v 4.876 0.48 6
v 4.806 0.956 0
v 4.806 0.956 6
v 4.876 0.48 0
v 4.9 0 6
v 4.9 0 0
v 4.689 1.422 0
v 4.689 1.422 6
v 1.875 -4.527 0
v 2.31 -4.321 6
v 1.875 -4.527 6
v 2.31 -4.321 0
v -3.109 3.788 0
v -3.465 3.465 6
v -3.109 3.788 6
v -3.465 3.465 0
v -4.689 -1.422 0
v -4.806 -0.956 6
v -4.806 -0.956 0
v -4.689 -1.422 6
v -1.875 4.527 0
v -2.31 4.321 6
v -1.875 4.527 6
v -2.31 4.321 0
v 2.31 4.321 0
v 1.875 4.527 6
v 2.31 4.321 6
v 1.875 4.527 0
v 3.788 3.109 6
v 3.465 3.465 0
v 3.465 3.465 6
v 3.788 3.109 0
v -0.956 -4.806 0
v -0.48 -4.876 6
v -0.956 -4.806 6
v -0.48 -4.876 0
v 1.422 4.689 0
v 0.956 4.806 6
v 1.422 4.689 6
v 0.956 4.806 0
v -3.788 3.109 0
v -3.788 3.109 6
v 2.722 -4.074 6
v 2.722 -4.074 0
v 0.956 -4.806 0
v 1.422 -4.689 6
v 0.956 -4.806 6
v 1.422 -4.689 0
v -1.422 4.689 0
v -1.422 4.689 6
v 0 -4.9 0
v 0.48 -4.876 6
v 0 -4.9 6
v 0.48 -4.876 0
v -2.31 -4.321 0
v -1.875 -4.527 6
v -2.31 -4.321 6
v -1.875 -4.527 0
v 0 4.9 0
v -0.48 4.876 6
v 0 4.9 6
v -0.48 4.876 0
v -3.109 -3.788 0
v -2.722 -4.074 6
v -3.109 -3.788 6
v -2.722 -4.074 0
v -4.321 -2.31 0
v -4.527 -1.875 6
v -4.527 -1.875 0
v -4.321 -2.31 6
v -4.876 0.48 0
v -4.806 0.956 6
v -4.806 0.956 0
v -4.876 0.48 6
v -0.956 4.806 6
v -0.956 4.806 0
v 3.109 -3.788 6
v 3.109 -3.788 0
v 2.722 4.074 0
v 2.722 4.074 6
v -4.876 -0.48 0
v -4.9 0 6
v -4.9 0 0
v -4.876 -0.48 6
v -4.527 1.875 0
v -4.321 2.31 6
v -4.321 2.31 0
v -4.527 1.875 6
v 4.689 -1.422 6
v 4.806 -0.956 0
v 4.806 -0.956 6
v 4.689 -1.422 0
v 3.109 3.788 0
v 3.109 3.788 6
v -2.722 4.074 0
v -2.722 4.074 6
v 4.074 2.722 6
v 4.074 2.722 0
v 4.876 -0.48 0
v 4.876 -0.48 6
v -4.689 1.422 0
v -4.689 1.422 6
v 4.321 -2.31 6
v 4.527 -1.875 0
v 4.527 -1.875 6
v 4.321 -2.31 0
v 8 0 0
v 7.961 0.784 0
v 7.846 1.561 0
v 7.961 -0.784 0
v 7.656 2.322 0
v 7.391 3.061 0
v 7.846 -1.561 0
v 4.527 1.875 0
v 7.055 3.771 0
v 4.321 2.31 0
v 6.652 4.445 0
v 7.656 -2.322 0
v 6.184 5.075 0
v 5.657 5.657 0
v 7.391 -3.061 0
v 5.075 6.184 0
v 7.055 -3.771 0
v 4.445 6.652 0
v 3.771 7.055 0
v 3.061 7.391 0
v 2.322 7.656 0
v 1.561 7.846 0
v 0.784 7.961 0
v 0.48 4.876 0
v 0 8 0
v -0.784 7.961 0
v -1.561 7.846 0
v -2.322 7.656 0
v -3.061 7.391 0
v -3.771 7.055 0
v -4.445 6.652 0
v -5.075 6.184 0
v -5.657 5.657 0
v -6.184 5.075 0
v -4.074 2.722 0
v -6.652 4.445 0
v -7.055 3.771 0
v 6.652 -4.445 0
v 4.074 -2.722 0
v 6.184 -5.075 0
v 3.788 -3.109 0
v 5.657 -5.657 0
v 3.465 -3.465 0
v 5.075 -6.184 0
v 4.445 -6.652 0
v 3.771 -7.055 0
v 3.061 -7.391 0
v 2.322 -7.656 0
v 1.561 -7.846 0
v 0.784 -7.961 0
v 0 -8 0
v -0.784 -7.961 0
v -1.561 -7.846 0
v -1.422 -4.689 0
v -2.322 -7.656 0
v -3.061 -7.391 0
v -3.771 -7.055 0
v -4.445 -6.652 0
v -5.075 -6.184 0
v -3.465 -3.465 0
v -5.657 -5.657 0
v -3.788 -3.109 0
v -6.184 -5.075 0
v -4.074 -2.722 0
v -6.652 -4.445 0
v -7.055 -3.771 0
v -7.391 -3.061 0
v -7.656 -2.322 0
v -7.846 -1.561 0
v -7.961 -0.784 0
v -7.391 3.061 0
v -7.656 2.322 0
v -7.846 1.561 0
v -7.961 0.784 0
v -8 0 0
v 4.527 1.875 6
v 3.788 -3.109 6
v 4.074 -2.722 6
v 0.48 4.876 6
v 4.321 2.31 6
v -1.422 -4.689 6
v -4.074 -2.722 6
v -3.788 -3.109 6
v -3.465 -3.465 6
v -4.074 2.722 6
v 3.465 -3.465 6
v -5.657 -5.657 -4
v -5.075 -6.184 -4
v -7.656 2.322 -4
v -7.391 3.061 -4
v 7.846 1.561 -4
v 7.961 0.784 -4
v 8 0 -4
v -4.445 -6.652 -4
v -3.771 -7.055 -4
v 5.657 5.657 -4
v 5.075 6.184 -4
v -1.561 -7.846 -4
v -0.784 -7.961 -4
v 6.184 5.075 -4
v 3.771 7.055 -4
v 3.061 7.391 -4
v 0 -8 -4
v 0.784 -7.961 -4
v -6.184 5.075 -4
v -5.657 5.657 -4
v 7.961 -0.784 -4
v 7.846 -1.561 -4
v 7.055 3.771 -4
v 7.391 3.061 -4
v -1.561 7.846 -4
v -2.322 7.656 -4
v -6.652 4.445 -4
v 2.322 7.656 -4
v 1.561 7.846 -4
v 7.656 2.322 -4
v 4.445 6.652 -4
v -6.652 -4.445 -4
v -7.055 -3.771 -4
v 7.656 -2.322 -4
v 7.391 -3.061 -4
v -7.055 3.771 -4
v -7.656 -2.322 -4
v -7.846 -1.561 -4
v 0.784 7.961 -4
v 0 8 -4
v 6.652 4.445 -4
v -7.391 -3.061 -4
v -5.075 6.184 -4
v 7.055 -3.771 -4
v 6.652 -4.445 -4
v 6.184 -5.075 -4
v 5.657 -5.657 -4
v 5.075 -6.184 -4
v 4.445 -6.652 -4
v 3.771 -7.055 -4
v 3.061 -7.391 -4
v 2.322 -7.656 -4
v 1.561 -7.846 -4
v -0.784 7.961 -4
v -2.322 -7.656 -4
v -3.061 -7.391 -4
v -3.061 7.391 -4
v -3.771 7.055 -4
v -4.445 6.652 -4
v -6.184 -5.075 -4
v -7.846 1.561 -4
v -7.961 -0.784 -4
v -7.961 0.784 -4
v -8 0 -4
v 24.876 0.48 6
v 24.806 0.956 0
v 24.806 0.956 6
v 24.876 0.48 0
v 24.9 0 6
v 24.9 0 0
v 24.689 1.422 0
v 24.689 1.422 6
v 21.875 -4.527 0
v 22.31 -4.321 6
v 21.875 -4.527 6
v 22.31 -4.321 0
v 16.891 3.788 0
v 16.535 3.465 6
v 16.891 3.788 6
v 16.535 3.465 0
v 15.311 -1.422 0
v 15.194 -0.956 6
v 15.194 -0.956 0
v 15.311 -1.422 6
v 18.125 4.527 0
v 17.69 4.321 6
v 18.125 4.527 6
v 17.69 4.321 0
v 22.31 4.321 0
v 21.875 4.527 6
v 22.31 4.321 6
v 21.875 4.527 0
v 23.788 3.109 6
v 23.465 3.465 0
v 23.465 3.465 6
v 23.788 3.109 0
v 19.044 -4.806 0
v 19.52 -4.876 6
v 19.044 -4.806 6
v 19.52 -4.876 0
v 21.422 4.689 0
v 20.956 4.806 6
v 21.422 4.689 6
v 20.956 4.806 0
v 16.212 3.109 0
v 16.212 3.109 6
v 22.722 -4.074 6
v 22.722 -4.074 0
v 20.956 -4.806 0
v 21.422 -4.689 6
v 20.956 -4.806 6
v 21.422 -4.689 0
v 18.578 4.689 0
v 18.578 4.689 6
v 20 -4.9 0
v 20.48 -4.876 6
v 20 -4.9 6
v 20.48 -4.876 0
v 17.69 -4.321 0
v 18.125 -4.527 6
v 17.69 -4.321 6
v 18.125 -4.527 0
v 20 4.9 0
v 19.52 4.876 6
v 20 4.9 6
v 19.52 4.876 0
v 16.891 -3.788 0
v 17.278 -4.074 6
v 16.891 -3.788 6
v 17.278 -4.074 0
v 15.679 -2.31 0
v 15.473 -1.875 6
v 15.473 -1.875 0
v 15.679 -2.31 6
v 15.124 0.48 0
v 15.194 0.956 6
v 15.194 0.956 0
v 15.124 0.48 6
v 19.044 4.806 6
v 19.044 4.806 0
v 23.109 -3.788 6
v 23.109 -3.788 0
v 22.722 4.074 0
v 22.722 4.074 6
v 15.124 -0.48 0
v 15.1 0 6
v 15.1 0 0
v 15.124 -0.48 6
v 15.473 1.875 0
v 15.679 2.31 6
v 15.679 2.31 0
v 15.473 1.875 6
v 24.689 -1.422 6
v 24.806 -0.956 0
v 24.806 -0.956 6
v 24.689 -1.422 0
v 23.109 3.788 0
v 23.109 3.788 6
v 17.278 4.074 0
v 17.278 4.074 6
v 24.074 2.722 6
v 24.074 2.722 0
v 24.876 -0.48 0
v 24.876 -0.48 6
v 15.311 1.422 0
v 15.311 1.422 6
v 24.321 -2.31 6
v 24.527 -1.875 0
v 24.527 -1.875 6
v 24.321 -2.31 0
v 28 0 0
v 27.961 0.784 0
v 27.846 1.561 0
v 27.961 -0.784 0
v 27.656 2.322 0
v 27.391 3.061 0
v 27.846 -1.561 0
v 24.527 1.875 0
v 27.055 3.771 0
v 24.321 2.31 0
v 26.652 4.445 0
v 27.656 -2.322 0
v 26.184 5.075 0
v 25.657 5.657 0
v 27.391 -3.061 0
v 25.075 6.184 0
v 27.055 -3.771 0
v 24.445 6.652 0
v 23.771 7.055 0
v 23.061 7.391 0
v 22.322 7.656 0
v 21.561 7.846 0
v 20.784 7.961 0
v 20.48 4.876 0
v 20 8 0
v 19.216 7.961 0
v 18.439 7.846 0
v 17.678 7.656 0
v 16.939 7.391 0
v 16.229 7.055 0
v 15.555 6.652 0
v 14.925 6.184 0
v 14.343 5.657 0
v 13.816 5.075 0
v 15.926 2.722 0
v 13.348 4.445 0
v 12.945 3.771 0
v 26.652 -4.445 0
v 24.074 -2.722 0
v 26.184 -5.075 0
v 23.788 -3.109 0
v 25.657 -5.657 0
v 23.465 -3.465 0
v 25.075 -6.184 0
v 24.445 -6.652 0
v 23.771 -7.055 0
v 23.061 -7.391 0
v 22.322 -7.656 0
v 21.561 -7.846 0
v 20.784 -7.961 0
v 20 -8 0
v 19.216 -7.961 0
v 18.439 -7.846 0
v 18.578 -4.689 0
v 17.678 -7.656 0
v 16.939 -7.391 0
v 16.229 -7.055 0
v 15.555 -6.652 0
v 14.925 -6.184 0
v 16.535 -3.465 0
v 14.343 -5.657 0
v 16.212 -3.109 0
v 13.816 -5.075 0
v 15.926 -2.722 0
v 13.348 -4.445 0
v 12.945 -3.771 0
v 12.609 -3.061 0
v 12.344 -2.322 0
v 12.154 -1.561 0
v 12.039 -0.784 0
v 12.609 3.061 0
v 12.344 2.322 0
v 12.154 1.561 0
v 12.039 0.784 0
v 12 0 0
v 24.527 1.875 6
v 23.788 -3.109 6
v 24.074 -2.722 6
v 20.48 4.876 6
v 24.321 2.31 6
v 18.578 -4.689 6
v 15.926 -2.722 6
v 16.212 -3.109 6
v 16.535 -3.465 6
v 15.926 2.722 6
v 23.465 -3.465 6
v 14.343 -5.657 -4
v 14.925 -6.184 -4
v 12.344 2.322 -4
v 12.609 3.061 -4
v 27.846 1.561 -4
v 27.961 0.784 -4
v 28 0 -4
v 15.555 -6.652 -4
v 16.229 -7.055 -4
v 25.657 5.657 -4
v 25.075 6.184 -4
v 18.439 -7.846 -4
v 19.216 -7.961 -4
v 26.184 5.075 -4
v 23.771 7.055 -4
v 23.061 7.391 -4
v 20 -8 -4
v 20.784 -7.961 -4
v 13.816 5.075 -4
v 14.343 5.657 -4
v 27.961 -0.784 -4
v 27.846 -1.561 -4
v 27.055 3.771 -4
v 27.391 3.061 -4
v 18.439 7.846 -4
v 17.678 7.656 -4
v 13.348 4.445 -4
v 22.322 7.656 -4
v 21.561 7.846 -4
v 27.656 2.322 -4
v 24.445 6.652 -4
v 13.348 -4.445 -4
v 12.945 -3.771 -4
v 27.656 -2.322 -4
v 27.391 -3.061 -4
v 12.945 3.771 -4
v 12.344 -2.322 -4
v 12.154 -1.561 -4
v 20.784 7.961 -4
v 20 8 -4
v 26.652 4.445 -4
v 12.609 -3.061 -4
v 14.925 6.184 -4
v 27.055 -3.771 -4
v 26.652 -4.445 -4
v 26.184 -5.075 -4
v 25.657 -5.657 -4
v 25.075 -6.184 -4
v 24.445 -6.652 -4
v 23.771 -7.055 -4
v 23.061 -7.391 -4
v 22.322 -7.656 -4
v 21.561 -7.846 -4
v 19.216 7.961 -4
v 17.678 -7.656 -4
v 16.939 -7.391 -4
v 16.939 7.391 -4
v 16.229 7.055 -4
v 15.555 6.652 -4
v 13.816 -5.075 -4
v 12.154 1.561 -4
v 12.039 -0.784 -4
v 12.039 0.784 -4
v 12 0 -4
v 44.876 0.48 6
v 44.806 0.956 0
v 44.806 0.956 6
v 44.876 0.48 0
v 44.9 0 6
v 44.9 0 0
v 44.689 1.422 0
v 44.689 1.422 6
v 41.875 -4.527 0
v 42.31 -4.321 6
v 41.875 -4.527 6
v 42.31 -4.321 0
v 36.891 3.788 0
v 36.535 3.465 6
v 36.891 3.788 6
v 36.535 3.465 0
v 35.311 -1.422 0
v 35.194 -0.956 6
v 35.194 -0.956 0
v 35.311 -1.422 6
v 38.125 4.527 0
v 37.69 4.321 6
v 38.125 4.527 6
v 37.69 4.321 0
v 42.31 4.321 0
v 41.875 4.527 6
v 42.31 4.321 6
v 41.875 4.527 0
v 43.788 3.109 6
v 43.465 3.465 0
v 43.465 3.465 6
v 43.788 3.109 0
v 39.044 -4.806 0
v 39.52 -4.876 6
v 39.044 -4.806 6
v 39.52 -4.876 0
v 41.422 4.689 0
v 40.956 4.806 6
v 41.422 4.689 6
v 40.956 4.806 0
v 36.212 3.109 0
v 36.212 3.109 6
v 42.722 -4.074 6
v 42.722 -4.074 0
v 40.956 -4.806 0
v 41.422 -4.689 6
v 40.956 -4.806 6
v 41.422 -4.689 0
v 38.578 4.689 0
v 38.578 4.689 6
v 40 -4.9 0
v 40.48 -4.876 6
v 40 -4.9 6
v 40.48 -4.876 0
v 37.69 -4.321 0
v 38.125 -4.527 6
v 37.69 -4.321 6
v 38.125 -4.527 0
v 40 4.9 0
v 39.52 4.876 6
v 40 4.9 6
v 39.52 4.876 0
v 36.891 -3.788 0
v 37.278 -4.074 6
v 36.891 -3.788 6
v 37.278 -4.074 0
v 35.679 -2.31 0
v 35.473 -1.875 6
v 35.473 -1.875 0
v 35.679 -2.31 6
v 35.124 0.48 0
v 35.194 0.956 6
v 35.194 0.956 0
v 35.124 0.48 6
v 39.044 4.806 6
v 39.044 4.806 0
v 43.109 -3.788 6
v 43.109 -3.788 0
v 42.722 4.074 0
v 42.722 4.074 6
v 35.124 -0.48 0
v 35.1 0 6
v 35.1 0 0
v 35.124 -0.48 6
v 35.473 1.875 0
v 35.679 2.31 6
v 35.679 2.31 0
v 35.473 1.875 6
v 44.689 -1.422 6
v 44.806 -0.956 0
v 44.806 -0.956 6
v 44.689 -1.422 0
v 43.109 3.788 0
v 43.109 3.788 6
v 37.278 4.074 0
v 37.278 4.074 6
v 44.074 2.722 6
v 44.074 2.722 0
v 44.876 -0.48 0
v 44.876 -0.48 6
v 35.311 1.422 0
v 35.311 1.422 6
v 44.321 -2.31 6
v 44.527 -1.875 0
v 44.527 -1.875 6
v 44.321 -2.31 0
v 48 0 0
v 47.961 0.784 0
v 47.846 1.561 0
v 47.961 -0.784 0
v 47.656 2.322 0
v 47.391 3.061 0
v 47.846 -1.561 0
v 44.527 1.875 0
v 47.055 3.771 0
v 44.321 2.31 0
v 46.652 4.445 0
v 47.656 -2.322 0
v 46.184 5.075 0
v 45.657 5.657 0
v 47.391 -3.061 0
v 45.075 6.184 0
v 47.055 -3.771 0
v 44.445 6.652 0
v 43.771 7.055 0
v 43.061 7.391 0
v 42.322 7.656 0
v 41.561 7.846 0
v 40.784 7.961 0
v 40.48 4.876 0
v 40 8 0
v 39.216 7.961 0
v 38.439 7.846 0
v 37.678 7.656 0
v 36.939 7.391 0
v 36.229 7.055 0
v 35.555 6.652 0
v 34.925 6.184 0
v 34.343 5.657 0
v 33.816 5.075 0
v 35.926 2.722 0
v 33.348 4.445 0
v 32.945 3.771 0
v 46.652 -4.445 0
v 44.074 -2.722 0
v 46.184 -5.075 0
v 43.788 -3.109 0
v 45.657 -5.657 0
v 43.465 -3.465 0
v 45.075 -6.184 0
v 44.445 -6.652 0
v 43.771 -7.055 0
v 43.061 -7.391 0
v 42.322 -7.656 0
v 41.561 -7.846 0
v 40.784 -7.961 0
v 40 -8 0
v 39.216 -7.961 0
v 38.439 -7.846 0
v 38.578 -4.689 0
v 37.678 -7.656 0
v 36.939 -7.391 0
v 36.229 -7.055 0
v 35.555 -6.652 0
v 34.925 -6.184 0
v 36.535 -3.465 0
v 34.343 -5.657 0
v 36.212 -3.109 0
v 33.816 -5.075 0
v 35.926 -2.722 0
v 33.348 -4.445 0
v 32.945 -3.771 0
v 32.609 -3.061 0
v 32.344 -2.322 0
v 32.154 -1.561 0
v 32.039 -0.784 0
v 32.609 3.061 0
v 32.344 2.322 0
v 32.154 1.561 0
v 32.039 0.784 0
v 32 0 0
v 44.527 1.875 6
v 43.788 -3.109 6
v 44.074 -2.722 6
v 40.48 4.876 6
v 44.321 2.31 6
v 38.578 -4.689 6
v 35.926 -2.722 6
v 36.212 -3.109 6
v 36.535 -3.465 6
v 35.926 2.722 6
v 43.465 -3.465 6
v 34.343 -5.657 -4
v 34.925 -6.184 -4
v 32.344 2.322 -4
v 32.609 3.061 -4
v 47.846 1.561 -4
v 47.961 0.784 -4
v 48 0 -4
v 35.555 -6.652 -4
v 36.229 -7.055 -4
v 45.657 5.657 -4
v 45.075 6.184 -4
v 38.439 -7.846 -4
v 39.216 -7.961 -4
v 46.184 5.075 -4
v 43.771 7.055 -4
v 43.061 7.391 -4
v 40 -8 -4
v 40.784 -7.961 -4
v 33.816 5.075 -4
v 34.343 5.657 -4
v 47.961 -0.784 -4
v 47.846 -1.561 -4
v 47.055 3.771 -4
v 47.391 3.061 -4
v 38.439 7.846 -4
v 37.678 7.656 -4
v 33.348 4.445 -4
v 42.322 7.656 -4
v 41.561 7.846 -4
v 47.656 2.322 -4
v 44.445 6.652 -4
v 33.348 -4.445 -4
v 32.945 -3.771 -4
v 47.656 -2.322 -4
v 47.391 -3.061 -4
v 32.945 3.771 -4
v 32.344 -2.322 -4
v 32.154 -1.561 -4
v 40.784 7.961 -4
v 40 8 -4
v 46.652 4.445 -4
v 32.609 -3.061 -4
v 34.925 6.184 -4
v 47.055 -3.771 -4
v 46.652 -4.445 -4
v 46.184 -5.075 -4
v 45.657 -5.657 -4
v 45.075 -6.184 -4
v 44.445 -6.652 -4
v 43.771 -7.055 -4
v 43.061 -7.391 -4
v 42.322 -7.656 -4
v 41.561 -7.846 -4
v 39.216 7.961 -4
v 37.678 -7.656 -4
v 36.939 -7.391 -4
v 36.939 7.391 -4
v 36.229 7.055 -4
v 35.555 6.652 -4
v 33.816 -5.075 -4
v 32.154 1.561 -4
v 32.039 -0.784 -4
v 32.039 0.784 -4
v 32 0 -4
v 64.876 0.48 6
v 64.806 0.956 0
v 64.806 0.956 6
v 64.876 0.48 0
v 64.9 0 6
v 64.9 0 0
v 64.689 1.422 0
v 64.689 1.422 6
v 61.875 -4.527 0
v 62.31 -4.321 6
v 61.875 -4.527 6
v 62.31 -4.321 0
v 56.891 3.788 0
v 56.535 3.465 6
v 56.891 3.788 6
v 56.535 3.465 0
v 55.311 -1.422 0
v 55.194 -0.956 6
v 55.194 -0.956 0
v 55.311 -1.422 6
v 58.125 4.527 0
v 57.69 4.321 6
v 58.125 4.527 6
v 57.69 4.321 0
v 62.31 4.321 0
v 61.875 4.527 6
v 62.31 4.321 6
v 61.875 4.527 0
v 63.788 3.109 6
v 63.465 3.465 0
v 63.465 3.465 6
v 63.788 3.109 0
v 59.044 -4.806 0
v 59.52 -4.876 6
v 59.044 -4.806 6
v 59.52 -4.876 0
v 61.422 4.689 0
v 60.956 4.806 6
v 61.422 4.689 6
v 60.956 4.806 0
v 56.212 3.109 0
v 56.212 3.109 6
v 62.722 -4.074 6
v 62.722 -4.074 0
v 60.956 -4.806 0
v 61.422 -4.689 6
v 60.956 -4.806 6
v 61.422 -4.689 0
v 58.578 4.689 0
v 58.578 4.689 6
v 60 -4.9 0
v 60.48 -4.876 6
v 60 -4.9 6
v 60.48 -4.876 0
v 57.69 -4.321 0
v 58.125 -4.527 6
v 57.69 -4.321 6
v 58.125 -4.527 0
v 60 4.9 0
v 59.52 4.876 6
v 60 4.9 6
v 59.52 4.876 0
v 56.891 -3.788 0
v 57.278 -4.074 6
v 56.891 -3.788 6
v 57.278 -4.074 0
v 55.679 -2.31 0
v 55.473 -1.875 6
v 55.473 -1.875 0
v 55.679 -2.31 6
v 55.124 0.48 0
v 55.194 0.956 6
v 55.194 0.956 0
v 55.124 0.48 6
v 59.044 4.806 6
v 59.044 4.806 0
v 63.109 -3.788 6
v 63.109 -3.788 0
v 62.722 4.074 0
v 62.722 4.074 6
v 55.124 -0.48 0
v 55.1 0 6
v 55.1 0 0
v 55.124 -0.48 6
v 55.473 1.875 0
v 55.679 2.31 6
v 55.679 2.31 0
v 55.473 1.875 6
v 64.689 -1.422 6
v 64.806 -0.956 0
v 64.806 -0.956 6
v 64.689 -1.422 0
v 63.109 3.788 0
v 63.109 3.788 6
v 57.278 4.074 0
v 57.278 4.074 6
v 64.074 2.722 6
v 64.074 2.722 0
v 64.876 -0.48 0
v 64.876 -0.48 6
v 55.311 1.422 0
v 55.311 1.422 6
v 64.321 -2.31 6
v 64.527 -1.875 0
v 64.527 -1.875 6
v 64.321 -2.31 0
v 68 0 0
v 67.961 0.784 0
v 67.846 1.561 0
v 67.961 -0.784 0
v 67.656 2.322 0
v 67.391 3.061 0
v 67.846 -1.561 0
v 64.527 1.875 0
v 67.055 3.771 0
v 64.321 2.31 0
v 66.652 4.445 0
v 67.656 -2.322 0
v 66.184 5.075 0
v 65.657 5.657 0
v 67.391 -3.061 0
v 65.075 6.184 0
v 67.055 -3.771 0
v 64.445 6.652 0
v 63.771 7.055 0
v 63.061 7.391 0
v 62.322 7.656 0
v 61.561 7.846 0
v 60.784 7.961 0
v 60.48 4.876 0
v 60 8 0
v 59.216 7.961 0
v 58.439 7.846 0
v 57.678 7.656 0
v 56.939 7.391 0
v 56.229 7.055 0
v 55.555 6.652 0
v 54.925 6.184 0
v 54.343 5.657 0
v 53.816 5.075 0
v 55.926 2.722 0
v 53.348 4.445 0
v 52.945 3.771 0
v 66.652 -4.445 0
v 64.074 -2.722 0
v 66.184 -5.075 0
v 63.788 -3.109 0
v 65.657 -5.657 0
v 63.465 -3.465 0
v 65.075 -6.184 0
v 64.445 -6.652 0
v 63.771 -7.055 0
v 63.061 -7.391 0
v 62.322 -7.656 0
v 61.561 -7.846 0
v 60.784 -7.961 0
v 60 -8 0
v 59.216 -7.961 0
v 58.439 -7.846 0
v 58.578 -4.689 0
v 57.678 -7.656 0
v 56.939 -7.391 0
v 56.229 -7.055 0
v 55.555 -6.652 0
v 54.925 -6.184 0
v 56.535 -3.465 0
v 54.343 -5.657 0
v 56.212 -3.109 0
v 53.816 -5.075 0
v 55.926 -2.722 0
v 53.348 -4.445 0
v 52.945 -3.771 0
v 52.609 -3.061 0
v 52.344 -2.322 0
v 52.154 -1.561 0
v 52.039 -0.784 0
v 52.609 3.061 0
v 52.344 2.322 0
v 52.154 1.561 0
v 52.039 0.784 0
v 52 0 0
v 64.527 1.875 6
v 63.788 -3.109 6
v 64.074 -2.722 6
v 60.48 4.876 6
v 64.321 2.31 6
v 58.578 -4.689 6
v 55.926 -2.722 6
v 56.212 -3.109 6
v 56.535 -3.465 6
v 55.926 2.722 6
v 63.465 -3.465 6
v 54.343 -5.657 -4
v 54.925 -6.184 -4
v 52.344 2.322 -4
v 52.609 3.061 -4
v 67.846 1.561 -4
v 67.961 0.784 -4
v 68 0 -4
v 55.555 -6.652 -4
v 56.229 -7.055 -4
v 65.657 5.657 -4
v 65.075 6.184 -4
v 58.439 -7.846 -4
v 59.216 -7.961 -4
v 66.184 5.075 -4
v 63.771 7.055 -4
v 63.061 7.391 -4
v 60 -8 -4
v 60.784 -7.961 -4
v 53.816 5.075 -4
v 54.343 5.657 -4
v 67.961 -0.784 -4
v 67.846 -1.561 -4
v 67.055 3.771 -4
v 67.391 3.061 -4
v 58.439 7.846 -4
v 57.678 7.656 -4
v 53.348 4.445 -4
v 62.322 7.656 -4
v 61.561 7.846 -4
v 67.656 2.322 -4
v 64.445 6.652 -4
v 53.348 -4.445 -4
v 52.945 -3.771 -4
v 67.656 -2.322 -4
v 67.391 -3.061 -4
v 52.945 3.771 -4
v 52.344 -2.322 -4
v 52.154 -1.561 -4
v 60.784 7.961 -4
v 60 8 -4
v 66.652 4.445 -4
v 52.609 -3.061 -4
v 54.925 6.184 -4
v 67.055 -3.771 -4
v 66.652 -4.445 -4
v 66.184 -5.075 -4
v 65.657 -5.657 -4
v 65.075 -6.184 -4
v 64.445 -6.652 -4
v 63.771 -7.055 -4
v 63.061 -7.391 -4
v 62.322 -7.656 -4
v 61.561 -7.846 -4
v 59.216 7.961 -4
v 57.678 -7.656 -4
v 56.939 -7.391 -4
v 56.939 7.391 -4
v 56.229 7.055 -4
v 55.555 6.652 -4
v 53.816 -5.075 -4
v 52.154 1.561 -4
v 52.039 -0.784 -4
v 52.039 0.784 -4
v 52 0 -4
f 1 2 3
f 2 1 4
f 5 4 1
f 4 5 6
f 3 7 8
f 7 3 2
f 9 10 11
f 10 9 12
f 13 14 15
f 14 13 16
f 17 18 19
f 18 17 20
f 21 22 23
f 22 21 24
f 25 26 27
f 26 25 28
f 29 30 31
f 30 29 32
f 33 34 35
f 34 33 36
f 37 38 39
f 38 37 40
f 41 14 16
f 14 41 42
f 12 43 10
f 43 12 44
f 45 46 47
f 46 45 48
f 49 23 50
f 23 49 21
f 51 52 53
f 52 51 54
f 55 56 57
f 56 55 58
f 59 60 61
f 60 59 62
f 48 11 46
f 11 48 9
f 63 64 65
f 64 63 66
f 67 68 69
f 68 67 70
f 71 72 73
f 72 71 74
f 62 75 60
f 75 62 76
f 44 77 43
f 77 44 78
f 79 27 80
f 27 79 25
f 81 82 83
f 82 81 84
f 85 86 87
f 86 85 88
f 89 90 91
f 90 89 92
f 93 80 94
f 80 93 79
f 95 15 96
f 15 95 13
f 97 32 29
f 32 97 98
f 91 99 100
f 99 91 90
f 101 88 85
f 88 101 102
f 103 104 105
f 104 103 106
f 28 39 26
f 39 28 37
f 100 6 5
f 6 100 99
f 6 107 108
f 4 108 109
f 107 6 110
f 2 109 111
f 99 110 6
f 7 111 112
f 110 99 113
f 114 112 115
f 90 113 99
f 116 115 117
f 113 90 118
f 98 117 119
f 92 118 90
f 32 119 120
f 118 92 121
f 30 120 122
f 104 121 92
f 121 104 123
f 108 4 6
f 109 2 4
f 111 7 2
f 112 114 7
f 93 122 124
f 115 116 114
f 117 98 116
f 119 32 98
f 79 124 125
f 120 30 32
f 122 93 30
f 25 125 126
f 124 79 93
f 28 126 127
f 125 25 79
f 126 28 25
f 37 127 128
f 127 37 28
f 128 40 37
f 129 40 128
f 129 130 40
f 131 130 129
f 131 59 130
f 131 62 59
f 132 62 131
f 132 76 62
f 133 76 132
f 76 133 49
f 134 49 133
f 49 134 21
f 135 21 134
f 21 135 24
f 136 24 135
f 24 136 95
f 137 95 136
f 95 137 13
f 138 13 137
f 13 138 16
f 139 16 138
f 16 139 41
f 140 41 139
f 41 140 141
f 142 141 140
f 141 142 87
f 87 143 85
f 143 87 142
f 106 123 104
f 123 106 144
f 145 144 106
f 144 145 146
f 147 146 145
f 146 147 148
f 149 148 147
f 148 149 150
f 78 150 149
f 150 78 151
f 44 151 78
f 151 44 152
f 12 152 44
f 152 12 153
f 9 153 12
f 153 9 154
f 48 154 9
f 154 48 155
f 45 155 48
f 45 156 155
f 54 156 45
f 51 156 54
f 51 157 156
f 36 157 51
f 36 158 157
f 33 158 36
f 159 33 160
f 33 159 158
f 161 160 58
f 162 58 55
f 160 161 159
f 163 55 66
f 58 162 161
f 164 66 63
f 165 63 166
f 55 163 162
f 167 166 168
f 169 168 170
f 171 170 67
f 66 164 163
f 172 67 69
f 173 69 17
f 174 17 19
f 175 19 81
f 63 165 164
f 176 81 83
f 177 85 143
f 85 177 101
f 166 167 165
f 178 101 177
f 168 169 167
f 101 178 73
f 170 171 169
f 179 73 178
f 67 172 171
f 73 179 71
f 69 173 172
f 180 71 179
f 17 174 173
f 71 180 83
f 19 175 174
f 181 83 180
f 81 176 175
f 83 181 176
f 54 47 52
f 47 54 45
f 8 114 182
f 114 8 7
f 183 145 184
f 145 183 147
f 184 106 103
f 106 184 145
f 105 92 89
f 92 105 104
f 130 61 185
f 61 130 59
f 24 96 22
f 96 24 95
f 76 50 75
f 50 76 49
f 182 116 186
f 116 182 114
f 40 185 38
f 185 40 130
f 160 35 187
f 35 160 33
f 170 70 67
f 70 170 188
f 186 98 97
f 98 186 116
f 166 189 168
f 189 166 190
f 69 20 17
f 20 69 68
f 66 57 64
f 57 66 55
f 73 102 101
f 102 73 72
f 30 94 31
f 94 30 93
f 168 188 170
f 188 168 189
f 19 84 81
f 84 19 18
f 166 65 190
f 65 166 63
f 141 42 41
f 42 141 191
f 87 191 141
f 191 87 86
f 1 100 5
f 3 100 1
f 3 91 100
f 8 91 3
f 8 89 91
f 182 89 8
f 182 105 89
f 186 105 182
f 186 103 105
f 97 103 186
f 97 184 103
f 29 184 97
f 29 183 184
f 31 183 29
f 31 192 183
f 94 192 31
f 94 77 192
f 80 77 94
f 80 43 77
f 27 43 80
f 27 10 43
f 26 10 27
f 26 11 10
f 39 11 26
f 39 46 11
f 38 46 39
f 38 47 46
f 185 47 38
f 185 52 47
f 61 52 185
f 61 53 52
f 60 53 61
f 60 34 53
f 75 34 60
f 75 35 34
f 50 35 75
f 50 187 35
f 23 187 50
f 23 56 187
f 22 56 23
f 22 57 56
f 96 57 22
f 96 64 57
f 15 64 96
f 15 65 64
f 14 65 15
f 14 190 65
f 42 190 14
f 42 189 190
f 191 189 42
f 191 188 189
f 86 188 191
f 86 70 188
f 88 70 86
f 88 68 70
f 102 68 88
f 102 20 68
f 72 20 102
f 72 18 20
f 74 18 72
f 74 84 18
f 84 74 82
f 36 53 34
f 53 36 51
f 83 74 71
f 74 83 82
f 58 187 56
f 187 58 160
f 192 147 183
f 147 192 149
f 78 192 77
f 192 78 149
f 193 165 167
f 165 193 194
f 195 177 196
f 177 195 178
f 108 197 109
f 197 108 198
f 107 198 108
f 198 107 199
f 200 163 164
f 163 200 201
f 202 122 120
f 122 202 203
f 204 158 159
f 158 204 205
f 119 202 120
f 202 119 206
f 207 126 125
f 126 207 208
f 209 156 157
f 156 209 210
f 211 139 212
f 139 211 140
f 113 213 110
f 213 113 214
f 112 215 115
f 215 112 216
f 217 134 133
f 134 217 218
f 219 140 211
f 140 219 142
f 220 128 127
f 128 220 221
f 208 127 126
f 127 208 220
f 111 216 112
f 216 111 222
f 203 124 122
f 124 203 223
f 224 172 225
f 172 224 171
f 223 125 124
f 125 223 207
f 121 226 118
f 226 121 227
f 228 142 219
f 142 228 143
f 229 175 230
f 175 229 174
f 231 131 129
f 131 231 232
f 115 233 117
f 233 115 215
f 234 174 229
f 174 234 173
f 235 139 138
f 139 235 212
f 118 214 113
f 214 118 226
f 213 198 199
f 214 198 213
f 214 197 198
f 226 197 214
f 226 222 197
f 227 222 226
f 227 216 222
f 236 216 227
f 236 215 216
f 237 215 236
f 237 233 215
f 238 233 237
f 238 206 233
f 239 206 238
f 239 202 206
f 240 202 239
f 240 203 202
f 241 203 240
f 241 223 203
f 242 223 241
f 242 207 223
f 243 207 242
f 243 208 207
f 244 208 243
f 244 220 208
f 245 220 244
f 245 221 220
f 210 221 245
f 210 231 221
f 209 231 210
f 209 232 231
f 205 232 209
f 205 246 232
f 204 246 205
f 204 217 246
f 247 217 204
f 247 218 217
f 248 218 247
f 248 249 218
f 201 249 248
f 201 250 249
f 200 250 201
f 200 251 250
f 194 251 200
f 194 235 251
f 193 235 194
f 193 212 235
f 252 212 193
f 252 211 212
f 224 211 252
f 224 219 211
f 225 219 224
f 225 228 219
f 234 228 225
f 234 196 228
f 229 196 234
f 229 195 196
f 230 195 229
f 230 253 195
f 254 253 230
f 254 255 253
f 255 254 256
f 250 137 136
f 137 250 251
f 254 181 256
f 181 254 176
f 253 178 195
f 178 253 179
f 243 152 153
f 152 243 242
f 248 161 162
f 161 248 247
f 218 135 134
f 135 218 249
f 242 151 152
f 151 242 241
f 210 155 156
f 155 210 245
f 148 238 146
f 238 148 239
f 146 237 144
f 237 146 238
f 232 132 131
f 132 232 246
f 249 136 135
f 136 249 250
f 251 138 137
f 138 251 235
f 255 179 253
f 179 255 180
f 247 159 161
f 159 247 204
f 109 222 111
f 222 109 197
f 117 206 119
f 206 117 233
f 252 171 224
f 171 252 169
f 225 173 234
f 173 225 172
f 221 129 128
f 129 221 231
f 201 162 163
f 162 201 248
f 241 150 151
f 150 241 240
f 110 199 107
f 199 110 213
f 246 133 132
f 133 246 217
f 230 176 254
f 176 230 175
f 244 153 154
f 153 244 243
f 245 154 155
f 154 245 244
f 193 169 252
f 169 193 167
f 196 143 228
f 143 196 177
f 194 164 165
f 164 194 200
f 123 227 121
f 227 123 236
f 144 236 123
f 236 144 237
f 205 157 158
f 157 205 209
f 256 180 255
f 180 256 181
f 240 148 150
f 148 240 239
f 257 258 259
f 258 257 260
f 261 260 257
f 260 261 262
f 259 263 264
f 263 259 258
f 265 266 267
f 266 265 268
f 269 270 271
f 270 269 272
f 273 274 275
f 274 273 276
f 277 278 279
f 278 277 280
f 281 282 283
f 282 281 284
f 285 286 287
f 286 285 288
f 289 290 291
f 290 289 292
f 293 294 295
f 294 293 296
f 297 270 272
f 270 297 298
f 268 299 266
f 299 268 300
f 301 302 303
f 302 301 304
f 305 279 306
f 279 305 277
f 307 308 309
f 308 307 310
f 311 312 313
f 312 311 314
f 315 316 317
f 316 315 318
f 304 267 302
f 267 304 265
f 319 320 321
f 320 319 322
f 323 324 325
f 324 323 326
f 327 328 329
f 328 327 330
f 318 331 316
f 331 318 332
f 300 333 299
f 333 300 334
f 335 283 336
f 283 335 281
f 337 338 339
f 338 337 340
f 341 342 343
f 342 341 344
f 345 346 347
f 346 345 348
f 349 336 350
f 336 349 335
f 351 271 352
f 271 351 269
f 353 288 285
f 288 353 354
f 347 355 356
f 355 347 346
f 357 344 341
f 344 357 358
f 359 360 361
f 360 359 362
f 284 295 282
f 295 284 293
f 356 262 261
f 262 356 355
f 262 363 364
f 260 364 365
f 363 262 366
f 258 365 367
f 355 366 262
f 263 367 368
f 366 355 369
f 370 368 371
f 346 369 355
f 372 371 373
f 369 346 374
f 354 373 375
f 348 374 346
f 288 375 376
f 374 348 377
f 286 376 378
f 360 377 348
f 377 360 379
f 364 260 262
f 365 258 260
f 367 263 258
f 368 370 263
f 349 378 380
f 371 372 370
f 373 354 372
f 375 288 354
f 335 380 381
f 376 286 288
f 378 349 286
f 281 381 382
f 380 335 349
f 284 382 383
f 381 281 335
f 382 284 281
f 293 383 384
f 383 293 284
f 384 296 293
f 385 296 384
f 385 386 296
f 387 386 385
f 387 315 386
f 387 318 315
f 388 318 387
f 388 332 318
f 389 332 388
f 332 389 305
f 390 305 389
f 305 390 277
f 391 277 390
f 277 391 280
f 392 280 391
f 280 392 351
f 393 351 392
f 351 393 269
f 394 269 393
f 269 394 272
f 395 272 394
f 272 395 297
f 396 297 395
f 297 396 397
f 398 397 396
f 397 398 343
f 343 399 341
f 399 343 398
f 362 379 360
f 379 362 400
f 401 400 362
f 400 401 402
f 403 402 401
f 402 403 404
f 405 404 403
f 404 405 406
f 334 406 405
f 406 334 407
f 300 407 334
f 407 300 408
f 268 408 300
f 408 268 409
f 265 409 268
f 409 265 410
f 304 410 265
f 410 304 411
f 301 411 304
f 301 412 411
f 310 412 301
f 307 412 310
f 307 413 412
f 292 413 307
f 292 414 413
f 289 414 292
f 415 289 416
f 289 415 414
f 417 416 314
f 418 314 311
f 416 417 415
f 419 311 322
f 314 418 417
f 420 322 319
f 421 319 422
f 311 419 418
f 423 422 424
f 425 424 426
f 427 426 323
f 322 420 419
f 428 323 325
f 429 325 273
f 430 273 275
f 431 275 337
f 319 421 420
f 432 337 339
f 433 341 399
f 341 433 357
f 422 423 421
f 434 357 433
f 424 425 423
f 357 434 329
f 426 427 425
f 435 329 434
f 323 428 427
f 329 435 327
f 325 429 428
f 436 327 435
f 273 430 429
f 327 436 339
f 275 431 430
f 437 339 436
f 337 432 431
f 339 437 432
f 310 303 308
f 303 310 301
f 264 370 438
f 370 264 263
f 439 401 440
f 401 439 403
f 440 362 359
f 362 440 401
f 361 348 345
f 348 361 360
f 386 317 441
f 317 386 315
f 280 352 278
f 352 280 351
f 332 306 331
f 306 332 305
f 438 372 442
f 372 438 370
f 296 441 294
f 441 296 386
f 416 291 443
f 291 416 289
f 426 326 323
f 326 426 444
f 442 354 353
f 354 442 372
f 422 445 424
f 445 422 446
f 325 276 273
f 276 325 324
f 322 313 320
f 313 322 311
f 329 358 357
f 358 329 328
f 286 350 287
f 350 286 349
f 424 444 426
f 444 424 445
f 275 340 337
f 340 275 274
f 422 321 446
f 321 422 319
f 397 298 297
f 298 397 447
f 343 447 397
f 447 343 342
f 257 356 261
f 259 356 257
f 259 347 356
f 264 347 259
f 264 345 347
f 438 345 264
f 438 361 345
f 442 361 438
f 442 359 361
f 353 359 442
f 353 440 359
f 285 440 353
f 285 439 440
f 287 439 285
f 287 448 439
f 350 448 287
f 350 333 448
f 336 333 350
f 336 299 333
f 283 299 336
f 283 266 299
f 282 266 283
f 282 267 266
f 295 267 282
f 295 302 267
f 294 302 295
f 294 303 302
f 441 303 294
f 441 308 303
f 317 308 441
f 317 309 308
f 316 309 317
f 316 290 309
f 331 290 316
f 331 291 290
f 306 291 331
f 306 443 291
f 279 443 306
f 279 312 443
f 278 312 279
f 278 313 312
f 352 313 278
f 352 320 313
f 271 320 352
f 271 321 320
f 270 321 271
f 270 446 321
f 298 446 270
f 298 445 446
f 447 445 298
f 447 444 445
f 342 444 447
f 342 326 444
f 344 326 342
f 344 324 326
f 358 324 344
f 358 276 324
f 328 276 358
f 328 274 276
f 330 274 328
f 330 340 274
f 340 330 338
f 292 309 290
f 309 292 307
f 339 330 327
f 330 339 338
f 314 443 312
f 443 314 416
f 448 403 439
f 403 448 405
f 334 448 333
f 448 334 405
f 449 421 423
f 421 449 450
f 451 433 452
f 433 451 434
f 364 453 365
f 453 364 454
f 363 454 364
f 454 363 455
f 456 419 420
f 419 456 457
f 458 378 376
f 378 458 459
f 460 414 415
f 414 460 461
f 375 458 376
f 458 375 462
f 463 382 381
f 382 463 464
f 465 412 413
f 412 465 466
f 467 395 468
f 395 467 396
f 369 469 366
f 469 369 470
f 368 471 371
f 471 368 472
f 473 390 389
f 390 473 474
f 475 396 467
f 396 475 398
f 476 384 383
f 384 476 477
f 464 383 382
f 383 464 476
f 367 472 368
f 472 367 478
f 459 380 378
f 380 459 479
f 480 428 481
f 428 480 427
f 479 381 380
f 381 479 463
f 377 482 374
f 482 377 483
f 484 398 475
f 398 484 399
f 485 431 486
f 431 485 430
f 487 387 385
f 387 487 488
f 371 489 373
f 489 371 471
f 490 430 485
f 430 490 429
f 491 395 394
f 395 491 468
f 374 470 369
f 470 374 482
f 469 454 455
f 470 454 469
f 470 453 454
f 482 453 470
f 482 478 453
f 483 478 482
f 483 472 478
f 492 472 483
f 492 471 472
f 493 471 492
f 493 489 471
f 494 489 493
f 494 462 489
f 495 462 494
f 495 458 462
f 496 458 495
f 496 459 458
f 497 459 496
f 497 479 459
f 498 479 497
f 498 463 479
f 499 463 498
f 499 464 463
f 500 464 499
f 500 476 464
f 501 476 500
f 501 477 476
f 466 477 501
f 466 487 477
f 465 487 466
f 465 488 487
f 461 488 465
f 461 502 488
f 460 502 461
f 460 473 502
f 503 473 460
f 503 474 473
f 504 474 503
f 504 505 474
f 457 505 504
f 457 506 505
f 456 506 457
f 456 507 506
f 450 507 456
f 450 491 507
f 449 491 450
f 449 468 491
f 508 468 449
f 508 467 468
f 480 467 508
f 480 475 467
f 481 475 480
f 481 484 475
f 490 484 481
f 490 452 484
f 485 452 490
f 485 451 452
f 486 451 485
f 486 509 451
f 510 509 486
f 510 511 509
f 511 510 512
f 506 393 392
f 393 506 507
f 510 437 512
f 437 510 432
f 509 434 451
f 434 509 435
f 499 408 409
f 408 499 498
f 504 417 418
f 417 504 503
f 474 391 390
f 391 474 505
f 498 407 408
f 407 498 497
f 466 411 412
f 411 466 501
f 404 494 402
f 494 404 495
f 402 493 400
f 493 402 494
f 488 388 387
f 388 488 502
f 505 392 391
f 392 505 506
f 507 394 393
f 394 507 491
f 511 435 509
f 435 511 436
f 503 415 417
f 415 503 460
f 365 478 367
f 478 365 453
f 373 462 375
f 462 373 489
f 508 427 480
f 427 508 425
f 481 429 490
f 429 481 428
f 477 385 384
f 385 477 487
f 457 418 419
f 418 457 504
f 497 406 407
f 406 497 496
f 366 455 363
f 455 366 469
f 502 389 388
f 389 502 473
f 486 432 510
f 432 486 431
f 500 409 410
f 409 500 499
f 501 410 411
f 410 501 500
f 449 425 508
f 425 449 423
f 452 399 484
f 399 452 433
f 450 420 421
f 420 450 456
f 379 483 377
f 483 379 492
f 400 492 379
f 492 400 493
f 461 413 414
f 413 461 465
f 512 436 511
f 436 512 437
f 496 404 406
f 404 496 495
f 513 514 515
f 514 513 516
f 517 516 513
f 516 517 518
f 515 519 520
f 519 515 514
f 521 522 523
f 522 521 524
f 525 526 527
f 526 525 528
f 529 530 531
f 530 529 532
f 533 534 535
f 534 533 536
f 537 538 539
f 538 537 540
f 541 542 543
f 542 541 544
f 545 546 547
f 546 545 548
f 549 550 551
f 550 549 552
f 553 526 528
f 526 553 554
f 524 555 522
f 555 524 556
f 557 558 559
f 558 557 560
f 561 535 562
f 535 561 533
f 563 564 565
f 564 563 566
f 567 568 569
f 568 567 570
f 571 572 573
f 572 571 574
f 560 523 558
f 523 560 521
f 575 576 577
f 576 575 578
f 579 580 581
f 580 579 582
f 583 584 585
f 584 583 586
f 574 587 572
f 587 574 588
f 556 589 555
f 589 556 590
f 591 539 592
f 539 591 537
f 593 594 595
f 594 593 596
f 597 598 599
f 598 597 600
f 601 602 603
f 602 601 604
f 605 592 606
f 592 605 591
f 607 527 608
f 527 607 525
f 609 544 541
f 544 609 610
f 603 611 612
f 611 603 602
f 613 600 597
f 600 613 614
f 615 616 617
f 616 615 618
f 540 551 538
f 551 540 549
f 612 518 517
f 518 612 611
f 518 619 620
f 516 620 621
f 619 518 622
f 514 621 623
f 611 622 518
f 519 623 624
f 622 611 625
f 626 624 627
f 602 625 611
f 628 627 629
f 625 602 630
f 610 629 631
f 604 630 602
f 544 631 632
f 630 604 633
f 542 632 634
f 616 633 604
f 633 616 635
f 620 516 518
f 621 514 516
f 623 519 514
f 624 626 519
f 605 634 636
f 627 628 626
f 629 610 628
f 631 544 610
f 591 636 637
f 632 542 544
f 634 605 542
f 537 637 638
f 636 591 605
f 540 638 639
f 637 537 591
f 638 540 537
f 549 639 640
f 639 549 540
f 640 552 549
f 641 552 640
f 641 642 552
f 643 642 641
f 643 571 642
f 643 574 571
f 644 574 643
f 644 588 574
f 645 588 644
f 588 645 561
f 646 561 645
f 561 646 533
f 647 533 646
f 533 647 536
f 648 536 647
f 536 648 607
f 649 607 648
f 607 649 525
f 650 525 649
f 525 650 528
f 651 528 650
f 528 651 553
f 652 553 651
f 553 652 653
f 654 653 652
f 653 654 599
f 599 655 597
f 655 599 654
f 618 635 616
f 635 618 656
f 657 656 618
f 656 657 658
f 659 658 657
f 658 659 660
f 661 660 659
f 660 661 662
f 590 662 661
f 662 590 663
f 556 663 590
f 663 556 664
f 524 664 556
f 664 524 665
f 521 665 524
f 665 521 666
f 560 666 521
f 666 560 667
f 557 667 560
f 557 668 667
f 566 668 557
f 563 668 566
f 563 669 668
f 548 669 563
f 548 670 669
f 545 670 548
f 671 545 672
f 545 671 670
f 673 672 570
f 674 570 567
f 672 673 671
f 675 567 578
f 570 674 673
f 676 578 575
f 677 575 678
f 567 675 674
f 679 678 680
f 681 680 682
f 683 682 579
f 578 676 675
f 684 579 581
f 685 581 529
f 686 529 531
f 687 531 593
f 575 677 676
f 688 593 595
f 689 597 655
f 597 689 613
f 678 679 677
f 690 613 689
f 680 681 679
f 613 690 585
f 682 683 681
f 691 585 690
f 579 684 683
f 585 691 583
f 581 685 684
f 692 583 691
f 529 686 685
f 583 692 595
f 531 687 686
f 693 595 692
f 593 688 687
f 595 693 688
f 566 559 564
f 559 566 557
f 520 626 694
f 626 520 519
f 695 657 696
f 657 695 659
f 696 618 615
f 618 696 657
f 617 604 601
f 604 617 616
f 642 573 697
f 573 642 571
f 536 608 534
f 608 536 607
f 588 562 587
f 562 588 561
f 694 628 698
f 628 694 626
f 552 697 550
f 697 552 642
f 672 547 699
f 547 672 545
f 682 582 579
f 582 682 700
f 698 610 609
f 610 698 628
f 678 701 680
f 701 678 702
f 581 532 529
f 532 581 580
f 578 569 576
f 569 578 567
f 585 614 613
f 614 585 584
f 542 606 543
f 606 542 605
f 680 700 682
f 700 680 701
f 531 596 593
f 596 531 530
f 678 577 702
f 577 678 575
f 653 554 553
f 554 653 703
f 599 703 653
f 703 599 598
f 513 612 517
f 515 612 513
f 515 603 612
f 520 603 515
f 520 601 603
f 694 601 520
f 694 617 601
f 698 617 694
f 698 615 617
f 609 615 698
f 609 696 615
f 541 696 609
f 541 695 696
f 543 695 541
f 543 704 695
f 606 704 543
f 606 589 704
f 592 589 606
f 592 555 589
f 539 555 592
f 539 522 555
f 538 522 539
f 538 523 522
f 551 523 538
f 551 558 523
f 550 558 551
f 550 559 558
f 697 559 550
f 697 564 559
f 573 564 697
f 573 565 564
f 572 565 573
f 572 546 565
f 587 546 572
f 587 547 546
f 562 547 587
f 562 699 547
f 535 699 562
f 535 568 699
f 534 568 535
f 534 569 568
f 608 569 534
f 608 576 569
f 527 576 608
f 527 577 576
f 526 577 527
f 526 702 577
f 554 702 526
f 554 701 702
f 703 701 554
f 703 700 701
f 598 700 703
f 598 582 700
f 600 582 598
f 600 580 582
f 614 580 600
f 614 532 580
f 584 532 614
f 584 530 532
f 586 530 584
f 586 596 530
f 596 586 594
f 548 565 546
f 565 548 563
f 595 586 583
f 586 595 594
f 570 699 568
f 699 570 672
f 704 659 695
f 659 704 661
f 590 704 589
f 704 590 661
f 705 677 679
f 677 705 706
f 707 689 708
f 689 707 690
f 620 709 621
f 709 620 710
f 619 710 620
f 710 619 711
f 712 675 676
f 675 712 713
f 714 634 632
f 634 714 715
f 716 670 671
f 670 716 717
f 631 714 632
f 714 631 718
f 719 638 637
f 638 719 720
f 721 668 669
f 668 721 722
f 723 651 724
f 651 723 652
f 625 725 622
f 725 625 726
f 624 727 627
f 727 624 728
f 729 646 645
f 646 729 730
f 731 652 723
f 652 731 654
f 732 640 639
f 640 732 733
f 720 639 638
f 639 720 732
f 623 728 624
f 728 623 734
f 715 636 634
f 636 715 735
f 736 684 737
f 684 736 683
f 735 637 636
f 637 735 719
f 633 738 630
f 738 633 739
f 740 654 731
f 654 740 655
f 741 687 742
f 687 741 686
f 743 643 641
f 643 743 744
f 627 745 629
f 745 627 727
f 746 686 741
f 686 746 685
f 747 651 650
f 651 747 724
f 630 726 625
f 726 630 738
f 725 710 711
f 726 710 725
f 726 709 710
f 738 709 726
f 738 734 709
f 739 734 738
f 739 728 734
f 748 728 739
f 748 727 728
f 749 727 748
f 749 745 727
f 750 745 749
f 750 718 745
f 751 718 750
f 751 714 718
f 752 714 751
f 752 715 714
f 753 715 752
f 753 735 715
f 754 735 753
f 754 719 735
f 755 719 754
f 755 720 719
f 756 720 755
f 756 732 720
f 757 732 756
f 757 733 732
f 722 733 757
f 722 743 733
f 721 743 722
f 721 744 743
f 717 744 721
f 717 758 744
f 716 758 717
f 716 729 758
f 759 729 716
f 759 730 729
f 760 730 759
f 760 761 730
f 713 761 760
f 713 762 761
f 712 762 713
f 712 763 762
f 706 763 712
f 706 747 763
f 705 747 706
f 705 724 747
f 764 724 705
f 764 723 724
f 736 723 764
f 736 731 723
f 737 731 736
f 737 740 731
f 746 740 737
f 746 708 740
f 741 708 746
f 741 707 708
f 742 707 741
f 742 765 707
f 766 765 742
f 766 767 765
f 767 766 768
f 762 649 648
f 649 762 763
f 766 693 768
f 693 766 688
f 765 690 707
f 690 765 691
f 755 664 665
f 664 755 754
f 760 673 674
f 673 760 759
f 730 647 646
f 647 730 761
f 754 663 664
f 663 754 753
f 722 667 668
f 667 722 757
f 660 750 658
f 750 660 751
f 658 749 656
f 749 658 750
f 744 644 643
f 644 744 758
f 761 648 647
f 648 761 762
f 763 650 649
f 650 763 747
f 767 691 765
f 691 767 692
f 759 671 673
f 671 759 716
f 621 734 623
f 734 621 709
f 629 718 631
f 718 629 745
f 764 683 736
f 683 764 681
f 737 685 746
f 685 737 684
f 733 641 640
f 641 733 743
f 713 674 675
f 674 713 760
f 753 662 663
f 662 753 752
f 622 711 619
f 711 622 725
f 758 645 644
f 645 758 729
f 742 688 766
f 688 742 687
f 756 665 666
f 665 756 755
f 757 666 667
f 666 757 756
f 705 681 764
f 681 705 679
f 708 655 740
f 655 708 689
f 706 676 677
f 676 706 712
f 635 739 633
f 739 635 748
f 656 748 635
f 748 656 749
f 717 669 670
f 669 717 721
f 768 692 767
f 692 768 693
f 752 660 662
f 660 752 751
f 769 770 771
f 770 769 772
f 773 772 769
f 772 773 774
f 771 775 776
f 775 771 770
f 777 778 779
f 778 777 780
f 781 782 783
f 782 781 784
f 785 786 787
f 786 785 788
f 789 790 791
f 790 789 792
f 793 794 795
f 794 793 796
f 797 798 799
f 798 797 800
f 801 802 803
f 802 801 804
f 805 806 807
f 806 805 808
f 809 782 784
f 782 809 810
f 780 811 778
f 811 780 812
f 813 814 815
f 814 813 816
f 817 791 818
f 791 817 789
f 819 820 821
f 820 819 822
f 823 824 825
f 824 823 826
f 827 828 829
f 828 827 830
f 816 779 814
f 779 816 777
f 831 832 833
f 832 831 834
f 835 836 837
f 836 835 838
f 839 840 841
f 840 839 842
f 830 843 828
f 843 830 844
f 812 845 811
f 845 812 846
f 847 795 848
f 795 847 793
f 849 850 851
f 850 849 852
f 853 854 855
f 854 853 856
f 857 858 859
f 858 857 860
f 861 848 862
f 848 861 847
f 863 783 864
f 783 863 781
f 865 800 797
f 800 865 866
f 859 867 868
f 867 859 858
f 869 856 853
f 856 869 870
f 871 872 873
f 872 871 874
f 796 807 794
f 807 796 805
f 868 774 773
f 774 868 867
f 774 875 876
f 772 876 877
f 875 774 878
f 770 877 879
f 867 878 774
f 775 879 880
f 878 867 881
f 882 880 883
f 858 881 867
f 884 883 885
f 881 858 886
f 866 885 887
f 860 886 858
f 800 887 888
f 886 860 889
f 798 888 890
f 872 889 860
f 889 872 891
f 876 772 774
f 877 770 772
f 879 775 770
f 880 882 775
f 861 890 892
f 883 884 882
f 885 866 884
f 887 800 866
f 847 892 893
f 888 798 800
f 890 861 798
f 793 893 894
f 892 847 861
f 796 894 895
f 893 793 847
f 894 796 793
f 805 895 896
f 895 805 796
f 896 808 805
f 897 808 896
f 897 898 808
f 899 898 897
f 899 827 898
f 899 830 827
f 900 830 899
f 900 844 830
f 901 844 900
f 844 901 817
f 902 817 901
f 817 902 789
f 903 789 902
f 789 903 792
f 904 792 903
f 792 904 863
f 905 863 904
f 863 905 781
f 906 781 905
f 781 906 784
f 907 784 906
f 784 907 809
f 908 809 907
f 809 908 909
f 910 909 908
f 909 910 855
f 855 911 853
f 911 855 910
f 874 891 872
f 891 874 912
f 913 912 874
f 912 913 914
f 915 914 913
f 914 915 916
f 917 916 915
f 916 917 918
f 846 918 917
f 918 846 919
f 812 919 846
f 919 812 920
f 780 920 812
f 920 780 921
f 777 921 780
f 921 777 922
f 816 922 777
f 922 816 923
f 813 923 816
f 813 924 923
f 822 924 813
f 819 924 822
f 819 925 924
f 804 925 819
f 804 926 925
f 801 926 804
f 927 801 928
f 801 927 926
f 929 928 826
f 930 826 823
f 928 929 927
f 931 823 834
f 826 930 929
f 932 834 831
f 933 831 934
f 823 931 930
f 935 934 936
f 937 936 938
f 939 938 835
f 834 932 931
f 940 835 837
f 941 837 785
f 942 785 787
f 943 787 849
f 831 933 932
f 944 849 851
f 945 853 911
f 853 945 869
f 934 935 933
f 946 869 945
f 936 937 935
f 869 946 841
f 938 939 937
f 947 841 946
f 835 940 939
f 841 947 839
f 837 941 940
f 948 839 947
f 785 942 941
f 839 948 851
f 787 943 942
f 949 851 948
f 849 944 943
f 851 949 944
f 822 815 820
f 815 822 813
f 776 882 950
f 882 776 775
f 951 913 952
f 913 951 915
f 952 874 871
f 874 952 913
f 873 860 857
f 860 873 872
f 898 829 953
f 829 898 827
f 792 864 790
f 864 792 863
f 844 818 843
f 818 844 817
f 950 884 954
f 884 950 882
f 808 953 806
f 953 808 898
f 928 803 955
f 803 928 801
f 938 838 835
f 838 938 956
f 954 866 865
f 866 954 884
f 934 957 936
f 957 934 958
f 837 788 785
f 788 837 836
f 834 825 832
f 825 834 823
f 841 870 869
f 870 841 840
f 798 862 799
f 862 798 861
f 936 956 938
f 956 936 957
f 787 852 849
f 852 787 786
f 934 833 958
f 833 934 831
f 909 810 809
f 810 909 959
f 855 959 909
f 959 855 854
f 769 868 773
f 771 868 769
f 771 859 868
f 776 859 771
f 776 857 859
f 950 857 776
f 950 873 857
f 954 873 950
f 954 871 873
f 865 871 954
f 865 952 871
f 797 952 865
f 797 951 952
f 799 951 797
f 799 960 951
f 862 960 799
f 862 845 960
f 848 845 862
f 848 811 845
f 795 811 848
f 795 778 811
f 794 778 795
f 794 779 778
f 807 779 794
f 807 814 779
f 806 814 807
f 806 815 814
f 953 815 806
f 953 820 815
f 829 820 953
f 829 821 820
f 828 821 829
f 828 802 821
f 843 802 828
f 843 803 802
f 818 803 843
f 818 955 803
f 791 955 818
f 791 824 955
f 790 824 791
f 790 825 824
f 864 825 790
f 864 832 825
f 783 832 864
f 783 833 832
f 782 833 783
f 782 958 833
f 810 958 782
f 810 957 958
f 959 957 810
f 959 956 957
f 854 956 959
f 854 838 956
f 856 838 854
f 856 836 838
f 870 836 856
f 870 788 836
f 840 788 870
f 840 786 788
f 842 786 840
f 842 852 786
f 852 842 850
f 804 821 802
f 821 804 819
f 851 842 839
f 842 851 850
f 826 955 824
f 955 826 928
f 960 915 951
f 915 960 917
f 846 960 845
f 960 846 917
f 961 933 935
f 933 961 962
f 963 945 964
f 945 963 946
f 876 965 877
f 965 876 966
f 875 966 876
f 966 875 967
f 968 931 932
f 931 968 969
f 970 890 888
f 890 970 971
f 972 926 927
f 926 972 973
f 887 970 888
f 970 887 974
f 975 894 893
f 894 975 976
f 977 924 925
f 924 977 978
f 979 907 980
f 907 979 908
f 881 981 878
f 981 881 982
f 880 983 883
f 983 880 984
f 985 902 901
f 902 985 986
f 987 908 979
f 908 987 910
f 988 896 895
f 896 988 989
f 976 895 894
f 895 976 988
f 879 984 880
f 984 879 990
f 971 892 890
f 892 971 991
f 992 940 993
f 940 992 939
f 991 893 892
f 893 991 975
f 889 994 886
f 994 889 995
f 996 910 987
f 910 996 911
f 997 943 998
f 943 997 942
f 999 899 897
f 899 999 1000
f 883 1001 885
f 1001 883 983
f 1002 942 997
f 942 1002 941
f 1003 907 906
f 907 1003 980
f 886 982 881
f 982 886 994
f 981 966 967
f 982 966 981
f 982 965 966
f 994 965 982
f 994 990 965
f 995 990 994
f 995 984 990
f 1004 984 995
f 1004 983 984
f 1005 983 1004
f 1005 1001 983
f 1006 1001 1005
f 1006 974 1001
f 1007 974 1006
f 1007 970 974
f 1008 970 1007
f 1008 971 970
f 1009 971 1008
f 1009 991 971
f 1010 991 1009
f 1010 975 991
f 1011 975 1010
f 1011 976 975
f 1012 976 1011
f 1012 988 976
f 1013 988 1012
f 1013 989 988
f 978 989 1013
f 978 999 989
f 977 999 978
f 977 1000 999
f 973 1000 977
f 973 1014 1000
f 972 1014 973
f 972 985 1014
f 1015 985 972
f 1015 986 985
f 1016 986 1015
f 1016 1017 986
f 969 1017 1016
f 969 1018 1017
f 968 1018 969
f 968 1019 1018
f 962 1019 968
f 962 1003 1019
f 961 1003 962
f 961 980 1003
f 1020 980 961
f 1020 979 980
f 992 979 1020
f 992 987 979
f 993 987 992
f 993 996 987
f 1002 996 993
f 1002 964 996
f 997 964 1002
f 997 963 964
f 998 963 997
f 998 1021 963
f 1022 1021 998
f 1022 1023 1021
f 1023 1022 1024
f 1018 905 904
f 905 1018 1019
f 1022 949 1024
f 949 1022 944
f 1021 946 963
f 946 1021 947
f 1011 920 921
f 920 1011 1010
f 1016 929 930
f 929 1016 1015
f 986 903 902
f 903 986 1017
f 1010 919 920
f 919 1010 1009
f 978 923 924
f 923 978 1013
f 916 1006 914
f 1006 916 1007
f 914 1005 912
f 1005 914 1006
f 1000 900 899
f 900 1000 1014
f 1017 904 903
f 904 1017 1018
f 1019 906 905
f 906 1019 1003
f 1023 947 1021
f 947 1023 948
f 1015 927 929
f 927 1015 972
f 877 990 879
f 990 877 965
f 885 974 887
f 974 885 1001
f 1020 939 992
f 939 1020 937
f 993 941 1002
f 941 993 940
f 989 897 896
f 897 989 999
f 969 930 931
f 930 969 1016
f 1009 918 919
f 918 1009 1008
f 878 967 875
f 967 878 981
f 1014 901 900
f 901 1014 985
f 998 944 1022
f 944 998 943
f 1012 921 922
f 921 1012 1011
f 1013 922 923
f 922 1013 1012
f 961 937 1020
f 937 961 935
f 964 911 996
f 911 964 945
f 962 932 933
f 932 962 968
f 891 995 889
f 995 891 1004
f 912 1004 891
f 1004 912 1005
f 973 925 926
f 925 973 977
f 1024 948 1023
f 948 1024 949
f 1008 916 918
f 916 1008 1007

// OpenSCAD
// file: params.scad
// Cat Feeder 5000 — Shared Parameters & Common Modules
// Include this file first in all part files: include <params.scad>

// ===== DIMENSIONS =====
WALL = 3;                // Standard wall thickness (mm)
THIN_WALL = 2.5;         // Thin walls (antenna arch, etc.)
FLOOR = 4;               // Base floor thickness
INSERT_BORE = 4.7;       // M3 heat-set insert pocket bore
M3_CLEAR = 3.4;          // M3 clearance hole
UNIT_W = 160;            // Main body width
UNIT_D = 240;            // Main body depth
UNIT_H = 160;            // Main body height
GATE_W = 118;            // Gate flap width
GATE_H = 90;             // Gate flap height
GATE_T = 3;              // Gate flap thickness
GATE_ROD_D = 3.2;        // Gate hinge rod diameter
ARCH_SPAN = 160;         // Antenna arch left-to-right span
ARCH_H = 70;             // Antenna arch height
ARCH_D = 40;             // Antenna arch depth (front-to-back)
COIL_CH_W = 16;          // Coil channel width
COIL_CH_D = 5;           // Coil channel depth
SERVO_W = 23;            // SG90 servo width
SERVO_D = 12.5;          // SG90 servo depth
SERVO_H = 30;            // SG90 servo height
SERVO_EAR_SPAN = 28;     // SG90 servo ear spacing
TOLERANCE = 0.1;         // General fit tolerance

// ===== RENDER QUALITY =====
$fn = 64;                // Circle resolution (smooth curves)

// ===== COLORS =====
COL_RFID = [0.8, 0.2, 0.2, 0.8];      // Red — RFID antenna arch
COL_TPU = [0.4, 0.7, 0.3, 0.8];       // Green — TPU flexible parts
COL_GATE = [0.2, 0.5, 0.8, 0.8];      // Blue — Gate mechanism
COL_BODY = [0.6, 0.6, 0.6, 0.8];      // Gray — Main body structure

// ===== COMMON MODULES =====

// M3 heat-set insert pocket (bore hole for pressed insert)
module m3_insert(h = 8) {
    cylinder(d = INSERT_BORE, h = h);
}

// M3 clearance hole (for bolt pass-through)
module m3_clear(h = 8) {
    cylinder(d = M3_CLEAR, h = h);
}

// Fillet box: rectangular box with filleted corners
// w, d, h = width, depth, height; r = corner radius
module fillet_box(w, d, h, r = 2) {
    hull() {
        translate([r, r, 0])
            cylinder(r = r, h = h);
        translate([w - r, r, 0])
            cylinder(r = r, h = h);
        translate([r, d - r, 0])
            cylinder(r = r, h = h);
        translate([w - r, d - r, 0])
            cylinder(r = r, h = h);
    }
}

// Boss: raised circular pad with M3 pocket
// Useful for internal reinforcement at bolt points
module boss(d = 10, h = 4, pocket = true) {
    difference() {
        cylinder(d = d, h = h);
        if (pocket)
            translate([0, 0, -0.1])
                m3_clear(h = h + 0.2);
    }
}
// main file
// Cat Feeder 5000 — Part 18: Non-Slip Feet
// Press-fit into base pockets. Print ×4 per unit (×8 total for 2 feeders).
// Print: TPU 95A, 0.3mm layers, 15% infill. Print SLOW (25mm/s).

include <params.scad>

color(COL_TPU) foot();

module foot() {
    STUD_D = 9.8;    // 0.2mm interference with 10mm pocket
    STUD_H = 6;
    PAD_D  = 16;
    PAD_H  = 4;

    union() {
        // Press-fit stud (goes into base pocket)
        cylinder(d=STUD_D, h=STUD_H);
        // Pad base (contacts floor)
        translate([0, 0, -PAD_H])
            cylinder(d=PAD_D, h=PAD_H);
    }
}

// Print all 4 feet in one go
for (i = [0:3])
    translate([i * 20, 0, 0])
        foot();
